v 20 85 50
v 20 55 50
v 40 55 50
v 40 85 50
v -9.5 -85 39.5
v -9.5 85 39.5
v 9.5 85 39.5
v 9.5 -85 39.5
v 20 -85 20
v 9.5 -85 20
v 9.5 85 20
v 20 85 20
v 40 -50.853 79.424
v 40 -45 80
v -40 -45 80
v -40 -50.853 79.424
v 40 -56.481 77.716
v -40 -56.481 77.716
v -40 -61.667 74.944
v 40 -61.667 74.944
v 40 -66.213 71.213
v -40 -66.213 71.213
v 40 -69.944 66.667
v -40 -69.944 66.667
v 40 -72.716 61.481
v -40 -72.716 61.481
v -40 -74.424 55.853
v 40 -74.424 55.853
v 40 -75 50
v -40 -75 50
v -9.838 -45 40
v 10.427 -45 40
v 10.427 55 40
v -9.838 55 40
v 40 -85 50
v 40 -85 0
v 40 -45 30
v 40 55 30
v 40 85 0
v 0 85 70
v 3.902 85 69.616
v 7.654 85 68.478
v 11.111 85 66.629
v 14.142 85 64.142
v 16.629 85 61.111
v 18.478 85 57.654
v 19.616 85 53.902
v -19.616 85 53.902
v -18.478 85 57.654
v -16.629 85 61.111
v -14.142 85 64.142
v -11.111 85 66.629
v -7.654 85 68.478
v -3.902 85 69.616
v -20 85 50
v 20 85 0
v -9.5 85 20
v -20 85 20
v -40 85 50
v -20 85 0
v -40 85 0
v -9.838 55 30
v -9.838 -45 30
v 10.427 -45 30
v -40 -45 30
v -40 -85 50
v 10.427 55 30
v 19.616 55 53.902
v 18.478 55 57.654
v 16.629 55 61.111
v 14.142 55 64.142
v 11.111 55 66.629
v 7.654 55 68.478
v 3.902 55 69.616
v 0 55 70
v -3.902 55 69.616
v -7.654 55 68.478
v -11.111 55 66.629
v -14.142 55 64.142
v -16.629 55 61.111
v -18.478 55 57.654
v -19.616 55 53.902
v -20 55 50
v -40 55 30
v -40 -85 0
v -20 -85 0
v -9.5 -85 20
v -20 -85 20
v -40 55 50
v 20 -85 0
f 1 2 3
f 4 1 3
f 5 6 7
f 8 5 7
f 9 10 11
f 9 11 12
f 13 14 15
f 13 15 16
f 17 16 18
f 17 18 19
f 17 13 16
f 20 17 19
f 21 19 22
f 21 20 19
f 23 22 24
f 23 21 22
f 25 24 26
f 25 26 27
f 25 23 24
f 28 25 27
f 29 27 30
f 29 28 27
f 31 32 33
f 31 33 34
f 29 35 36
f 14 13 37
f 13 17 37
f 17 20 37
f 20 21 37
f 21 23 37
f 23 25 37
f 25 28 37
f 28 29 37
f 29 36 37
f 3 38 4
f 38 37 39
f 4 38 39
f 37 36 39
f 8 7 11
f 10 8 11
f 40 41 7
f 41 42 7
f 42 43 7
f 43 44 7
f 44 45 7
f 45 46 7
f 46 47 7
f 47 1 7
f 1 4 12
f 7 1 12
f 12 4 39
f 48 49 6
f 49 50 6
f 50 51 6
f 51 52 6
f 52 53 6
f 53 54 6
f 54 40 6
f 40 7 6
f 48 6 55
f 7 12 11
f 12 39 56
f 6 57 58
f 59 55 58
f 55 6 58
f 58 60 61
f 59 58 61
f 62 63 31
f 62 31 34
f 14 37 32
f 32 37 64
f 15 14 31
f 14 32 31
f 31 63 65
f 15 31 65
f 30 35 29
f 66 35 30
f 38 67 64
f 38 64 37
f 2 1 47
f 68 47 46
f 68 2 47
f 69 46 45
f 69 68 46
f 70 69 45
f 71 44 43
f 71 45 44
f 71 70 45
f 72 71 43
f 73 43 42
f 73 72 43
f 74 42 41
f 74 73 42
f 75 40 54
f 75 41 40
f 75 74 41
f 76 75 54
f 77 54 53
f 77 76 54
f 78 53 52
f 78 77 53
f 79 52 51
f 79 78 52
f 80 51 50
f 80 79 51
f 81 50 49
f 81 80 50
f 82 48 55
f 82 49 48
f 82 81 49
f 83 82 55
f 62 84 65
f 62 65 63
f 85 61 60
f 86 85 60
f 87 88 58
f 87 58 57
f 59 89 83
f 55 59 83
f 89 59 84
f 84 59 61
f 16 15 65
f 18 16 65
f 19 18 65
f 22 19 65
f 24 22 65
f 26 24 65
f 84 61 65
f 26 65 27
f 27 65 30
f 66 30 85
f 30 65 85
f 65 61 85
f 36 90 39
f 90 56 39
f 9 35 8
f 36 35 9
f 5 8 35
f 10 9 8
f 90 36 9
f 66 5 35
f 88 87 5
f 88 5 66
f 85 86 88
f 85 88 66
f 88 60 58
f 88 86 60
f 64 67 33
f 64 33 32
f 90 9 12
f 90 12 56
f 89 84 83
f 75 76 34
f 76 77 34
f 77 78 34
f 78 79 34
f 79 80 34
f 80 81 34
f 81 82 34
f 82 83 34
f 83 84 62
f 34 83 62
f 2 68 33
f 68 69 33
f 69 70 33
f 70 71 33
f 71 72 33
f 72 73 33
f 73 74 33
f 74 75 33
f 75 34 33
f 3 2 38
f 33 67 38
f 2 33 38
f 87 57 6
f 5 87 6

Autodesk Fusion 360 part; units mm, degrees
sketch "Sketch1" plane through (0, 0, 0) normal (0, 0, 1) x (1, 0, 0) in component "Component"
  line L0 (40, -85) -> (-40, -85)
  line L1 (-40, -85) -> (-40, 85)
  line L2 (-40, 85) -> (40, 85)
  line L3 (40, 85) -> (40, -85)
  line L4 (40, -85) -> (-40, 85) construction
  line L5 (-40, -85) -> (40, 85) construction
  dimension "d1" = 80
  dimension "d2" = 170
extrude "Extrude1" add sketch "Sketch1" along normal blind 30 in component "Component"
sketch "Sketch2" plane through (0, 0, 30) normal (0, 0, 1) x (-1, 0, 0) in component "Component"
  line L0 (-40, -85) -> (40, -85)
  line L1 (40, -85) -> (40, 85)
  line L2 (40, 85) -> (-40, 85)
  line L3 (-40, 85) -> (-40, -85)
  line L4 (40, 75) -> (-40, 75)
  dimension "d5" = 10
extrude "Extrude2" add sketch "Sketch2" along normal blind 20 contours L1 L2 L3 L4 in component "Component"
sketch "Sketch3" plane through (0, -85, 0) normal (0, -1, 0) x (1, 0, 0) in component "Component"
  line L0 (-40, 0) -> (40, 0)
  line L1 (40, 0) -> (40, 50)
  line L2 (40, 50) -> (-40, 50)
  line L3 (-40, 50) -> (-40, 0)
  line L4 (-20, 0) -> (-20, 20)
  line L5 (-20, 20) -> (-10, 20)
  line L6 (-10, 20) -> (-10, 40)
  line L7 (-10, 40) -> (10, 40)
  line L8 (10, 40) -> (10, 20)
  line L9 (10, 20) -> (20, 20)
  line L10 (20, 20) -> (20, 0)
sketch "Sketch4" plane through (0, 0, 30) normal (0, 0, 1) x (-1, 0, 0) in component "Component"
  line L0 (40, 75) -> (-40, 75)
  line L1 (-40, 75) -> (-40, -85)
  line L2 (-40, -85) -> (40, -85)
  line L3 (40, -85) -> (40, 75)
  line L4 (40, -55) -> (-40, -55)
  dimension "d10" = 30
extrude "Extrude4" add sketch "Sketch4" along normal blind 40 contours L1 L2 L3 L4 in component "Component"
sketch "Sketch5" plane through (0, 55, 0) normal (0, -1, 0) x (1, 0, 0) in component "Component"
  line L0 (-40, 30) -> (40, 30)
  line L1 (40, 30) -> (40, 70)
  line L2 (40, 70) -> (-40, 70)
  line L3 (-40, 70) -> (-40, 30)
  circle A0 centre (0, 50) radius 20
  line L4 (-40, 50) -> (40, 50)
  dimension "d13" = 40
  dimension "d14" = 20
extrude "Extrude5" cut sketch "Sketch5" against normal up to surface (30 mm away) contours L2 L3 A0 L4 | L1 L2 A0 L4 in component "Component"
sketch "Sketch6" plane through (0, 0, 30) normal (0, 0, 1) x (-1, 0, 0) in component "Component"
  line L0 (-40, -55) -> (40, -55)
  line L1 (40, -55) -> (40, 75)
  line L2 (40, 75) -> (-40, 75)
  line L3 (-40, 75) -> (-40, -55)
  line L4 (-40, 45) -> (40, 45)
  dimension "d17" = 30
extrude "Extrude6" add sketch "Sketch6" along normal blind 50 contours L1 L2 L3 L4 in component "Component"
sketch "Sketch7" plane through (40, 0, 0) normal (1, 0, 0) x (0, 1, 0) in component "Component"
  line L0 (85, 50) -> (55, 50)
  line L1 (55, 50) -> (55, 30)
  line L2 (55, 30) -> (-45, 30)
  line L3 (-45, 30) -> (-45, 80)
  line L4 (-45, 80) -> (-75, 80)
  line L5 (-75, 80) -> (-75, 50)
  line L6 (-75, 50) -> (-85, 50)
  line L7 (-85, 50) -> (-85, 0)
  line L8 (-85, 0) -> (85, 0)
  line L9 (85, 0) -> (85, 50)
  circle A0 centre (-45, 50) radius 30
  dimension "d20" = 60
extrude "Extrude7" cut sketch "Sketch7" against normal up to surface (80 mm away) contours L4 L5 A0 in component "Component"
sketch "Sketch8" plane through (0, -85, 0) normal (0, -1, 0) x (1, 0, 0) in component "Component"
  line L0 (-40, 0) -> (40, 0)
  line L1 (40, 0) -> (40, 50)
  line L2 (40, 50) -> (-40, 50)
  line L3 (-40, 50) -> (-40, 0)
  line L4 (-20, 0) -> (-20, 20)
  line L5 (-20, 20) -> (-10, 20)
  line L6 (10, 20) -> (20, 20)
  line L7 (20, 20) -> (20, 0)
  line L8 (10, 20) -> (-10, 20)
extrude "Extrude8" cut sketch "Sketch8" against normal up to surface (170 mm away) contours L0 L4 L5 L6 L7 L8 in component "Component"
sketch "Sketch10" plane through (0, 0, 30) normal (0, 0, 1) x (-1, 0, 0) in component "Component"
  line L0 (40, 45) -> (-40, 45)
  line L1 (-40, 45) -> (-40, -55)
  line L2 (-40, -55) -> (40, -55)
  line L3 (40, -55) -> (40, 45)
  line L4 (-10.4269, -55) -> (-10.4269, 45)
  line L5 (9.8376, 45) -> (9.8376, -55)
extrude "Extrude9" add sketch "Sketch10" along normal blind 10 contours L0 L2 L4 L5 in component "Component"
sketch "Sketch13" plane through (0, -85, 0) normal (0, -1, 0) x (1, 0, 0) in component "Component"
  line L0 (-20, 0) -> (-20, 20)
  line L1 (-20, 20) -> (20, 20)
  line L2 (20, 20) -> (20, 0)
  line L3 (20, 0) -> (40, 0)
  line L4 (40, 0) -> (40, 50)
  line L5 (40, 50) -> (-40, 50)
  line L6 (-40, 50) -> (-40, 0)
  line L7 (-40, 0) -> (-20, 0)
  line L8 (-10, 20) -> (-10, 40)
  line L9 (-10, 40) -> (10, 40)
  line L10 (10, 40) -> (10, 20)
  line L11 (-9.5, 20) -> (-9.5, 39.5)
  line L12 (-9.5, 39.5) -> (9.5, 39.5)
  line L13 (9.5, 39.5) -> (9.5, 20)
  dimension "d38" = 0.5
  dimension "d39" = 0.5
  dimension "d40" = 0.5
extrude "Extrude10" cut sketch "Sketch13" against normal up to surface (170 mm away) contours L1 L11 L12 L13 in component "Component"
component "Component" placed x (1, 0, 0) y (0, 1, 0) z (0, 0, 1) at (0, 0, 0)
